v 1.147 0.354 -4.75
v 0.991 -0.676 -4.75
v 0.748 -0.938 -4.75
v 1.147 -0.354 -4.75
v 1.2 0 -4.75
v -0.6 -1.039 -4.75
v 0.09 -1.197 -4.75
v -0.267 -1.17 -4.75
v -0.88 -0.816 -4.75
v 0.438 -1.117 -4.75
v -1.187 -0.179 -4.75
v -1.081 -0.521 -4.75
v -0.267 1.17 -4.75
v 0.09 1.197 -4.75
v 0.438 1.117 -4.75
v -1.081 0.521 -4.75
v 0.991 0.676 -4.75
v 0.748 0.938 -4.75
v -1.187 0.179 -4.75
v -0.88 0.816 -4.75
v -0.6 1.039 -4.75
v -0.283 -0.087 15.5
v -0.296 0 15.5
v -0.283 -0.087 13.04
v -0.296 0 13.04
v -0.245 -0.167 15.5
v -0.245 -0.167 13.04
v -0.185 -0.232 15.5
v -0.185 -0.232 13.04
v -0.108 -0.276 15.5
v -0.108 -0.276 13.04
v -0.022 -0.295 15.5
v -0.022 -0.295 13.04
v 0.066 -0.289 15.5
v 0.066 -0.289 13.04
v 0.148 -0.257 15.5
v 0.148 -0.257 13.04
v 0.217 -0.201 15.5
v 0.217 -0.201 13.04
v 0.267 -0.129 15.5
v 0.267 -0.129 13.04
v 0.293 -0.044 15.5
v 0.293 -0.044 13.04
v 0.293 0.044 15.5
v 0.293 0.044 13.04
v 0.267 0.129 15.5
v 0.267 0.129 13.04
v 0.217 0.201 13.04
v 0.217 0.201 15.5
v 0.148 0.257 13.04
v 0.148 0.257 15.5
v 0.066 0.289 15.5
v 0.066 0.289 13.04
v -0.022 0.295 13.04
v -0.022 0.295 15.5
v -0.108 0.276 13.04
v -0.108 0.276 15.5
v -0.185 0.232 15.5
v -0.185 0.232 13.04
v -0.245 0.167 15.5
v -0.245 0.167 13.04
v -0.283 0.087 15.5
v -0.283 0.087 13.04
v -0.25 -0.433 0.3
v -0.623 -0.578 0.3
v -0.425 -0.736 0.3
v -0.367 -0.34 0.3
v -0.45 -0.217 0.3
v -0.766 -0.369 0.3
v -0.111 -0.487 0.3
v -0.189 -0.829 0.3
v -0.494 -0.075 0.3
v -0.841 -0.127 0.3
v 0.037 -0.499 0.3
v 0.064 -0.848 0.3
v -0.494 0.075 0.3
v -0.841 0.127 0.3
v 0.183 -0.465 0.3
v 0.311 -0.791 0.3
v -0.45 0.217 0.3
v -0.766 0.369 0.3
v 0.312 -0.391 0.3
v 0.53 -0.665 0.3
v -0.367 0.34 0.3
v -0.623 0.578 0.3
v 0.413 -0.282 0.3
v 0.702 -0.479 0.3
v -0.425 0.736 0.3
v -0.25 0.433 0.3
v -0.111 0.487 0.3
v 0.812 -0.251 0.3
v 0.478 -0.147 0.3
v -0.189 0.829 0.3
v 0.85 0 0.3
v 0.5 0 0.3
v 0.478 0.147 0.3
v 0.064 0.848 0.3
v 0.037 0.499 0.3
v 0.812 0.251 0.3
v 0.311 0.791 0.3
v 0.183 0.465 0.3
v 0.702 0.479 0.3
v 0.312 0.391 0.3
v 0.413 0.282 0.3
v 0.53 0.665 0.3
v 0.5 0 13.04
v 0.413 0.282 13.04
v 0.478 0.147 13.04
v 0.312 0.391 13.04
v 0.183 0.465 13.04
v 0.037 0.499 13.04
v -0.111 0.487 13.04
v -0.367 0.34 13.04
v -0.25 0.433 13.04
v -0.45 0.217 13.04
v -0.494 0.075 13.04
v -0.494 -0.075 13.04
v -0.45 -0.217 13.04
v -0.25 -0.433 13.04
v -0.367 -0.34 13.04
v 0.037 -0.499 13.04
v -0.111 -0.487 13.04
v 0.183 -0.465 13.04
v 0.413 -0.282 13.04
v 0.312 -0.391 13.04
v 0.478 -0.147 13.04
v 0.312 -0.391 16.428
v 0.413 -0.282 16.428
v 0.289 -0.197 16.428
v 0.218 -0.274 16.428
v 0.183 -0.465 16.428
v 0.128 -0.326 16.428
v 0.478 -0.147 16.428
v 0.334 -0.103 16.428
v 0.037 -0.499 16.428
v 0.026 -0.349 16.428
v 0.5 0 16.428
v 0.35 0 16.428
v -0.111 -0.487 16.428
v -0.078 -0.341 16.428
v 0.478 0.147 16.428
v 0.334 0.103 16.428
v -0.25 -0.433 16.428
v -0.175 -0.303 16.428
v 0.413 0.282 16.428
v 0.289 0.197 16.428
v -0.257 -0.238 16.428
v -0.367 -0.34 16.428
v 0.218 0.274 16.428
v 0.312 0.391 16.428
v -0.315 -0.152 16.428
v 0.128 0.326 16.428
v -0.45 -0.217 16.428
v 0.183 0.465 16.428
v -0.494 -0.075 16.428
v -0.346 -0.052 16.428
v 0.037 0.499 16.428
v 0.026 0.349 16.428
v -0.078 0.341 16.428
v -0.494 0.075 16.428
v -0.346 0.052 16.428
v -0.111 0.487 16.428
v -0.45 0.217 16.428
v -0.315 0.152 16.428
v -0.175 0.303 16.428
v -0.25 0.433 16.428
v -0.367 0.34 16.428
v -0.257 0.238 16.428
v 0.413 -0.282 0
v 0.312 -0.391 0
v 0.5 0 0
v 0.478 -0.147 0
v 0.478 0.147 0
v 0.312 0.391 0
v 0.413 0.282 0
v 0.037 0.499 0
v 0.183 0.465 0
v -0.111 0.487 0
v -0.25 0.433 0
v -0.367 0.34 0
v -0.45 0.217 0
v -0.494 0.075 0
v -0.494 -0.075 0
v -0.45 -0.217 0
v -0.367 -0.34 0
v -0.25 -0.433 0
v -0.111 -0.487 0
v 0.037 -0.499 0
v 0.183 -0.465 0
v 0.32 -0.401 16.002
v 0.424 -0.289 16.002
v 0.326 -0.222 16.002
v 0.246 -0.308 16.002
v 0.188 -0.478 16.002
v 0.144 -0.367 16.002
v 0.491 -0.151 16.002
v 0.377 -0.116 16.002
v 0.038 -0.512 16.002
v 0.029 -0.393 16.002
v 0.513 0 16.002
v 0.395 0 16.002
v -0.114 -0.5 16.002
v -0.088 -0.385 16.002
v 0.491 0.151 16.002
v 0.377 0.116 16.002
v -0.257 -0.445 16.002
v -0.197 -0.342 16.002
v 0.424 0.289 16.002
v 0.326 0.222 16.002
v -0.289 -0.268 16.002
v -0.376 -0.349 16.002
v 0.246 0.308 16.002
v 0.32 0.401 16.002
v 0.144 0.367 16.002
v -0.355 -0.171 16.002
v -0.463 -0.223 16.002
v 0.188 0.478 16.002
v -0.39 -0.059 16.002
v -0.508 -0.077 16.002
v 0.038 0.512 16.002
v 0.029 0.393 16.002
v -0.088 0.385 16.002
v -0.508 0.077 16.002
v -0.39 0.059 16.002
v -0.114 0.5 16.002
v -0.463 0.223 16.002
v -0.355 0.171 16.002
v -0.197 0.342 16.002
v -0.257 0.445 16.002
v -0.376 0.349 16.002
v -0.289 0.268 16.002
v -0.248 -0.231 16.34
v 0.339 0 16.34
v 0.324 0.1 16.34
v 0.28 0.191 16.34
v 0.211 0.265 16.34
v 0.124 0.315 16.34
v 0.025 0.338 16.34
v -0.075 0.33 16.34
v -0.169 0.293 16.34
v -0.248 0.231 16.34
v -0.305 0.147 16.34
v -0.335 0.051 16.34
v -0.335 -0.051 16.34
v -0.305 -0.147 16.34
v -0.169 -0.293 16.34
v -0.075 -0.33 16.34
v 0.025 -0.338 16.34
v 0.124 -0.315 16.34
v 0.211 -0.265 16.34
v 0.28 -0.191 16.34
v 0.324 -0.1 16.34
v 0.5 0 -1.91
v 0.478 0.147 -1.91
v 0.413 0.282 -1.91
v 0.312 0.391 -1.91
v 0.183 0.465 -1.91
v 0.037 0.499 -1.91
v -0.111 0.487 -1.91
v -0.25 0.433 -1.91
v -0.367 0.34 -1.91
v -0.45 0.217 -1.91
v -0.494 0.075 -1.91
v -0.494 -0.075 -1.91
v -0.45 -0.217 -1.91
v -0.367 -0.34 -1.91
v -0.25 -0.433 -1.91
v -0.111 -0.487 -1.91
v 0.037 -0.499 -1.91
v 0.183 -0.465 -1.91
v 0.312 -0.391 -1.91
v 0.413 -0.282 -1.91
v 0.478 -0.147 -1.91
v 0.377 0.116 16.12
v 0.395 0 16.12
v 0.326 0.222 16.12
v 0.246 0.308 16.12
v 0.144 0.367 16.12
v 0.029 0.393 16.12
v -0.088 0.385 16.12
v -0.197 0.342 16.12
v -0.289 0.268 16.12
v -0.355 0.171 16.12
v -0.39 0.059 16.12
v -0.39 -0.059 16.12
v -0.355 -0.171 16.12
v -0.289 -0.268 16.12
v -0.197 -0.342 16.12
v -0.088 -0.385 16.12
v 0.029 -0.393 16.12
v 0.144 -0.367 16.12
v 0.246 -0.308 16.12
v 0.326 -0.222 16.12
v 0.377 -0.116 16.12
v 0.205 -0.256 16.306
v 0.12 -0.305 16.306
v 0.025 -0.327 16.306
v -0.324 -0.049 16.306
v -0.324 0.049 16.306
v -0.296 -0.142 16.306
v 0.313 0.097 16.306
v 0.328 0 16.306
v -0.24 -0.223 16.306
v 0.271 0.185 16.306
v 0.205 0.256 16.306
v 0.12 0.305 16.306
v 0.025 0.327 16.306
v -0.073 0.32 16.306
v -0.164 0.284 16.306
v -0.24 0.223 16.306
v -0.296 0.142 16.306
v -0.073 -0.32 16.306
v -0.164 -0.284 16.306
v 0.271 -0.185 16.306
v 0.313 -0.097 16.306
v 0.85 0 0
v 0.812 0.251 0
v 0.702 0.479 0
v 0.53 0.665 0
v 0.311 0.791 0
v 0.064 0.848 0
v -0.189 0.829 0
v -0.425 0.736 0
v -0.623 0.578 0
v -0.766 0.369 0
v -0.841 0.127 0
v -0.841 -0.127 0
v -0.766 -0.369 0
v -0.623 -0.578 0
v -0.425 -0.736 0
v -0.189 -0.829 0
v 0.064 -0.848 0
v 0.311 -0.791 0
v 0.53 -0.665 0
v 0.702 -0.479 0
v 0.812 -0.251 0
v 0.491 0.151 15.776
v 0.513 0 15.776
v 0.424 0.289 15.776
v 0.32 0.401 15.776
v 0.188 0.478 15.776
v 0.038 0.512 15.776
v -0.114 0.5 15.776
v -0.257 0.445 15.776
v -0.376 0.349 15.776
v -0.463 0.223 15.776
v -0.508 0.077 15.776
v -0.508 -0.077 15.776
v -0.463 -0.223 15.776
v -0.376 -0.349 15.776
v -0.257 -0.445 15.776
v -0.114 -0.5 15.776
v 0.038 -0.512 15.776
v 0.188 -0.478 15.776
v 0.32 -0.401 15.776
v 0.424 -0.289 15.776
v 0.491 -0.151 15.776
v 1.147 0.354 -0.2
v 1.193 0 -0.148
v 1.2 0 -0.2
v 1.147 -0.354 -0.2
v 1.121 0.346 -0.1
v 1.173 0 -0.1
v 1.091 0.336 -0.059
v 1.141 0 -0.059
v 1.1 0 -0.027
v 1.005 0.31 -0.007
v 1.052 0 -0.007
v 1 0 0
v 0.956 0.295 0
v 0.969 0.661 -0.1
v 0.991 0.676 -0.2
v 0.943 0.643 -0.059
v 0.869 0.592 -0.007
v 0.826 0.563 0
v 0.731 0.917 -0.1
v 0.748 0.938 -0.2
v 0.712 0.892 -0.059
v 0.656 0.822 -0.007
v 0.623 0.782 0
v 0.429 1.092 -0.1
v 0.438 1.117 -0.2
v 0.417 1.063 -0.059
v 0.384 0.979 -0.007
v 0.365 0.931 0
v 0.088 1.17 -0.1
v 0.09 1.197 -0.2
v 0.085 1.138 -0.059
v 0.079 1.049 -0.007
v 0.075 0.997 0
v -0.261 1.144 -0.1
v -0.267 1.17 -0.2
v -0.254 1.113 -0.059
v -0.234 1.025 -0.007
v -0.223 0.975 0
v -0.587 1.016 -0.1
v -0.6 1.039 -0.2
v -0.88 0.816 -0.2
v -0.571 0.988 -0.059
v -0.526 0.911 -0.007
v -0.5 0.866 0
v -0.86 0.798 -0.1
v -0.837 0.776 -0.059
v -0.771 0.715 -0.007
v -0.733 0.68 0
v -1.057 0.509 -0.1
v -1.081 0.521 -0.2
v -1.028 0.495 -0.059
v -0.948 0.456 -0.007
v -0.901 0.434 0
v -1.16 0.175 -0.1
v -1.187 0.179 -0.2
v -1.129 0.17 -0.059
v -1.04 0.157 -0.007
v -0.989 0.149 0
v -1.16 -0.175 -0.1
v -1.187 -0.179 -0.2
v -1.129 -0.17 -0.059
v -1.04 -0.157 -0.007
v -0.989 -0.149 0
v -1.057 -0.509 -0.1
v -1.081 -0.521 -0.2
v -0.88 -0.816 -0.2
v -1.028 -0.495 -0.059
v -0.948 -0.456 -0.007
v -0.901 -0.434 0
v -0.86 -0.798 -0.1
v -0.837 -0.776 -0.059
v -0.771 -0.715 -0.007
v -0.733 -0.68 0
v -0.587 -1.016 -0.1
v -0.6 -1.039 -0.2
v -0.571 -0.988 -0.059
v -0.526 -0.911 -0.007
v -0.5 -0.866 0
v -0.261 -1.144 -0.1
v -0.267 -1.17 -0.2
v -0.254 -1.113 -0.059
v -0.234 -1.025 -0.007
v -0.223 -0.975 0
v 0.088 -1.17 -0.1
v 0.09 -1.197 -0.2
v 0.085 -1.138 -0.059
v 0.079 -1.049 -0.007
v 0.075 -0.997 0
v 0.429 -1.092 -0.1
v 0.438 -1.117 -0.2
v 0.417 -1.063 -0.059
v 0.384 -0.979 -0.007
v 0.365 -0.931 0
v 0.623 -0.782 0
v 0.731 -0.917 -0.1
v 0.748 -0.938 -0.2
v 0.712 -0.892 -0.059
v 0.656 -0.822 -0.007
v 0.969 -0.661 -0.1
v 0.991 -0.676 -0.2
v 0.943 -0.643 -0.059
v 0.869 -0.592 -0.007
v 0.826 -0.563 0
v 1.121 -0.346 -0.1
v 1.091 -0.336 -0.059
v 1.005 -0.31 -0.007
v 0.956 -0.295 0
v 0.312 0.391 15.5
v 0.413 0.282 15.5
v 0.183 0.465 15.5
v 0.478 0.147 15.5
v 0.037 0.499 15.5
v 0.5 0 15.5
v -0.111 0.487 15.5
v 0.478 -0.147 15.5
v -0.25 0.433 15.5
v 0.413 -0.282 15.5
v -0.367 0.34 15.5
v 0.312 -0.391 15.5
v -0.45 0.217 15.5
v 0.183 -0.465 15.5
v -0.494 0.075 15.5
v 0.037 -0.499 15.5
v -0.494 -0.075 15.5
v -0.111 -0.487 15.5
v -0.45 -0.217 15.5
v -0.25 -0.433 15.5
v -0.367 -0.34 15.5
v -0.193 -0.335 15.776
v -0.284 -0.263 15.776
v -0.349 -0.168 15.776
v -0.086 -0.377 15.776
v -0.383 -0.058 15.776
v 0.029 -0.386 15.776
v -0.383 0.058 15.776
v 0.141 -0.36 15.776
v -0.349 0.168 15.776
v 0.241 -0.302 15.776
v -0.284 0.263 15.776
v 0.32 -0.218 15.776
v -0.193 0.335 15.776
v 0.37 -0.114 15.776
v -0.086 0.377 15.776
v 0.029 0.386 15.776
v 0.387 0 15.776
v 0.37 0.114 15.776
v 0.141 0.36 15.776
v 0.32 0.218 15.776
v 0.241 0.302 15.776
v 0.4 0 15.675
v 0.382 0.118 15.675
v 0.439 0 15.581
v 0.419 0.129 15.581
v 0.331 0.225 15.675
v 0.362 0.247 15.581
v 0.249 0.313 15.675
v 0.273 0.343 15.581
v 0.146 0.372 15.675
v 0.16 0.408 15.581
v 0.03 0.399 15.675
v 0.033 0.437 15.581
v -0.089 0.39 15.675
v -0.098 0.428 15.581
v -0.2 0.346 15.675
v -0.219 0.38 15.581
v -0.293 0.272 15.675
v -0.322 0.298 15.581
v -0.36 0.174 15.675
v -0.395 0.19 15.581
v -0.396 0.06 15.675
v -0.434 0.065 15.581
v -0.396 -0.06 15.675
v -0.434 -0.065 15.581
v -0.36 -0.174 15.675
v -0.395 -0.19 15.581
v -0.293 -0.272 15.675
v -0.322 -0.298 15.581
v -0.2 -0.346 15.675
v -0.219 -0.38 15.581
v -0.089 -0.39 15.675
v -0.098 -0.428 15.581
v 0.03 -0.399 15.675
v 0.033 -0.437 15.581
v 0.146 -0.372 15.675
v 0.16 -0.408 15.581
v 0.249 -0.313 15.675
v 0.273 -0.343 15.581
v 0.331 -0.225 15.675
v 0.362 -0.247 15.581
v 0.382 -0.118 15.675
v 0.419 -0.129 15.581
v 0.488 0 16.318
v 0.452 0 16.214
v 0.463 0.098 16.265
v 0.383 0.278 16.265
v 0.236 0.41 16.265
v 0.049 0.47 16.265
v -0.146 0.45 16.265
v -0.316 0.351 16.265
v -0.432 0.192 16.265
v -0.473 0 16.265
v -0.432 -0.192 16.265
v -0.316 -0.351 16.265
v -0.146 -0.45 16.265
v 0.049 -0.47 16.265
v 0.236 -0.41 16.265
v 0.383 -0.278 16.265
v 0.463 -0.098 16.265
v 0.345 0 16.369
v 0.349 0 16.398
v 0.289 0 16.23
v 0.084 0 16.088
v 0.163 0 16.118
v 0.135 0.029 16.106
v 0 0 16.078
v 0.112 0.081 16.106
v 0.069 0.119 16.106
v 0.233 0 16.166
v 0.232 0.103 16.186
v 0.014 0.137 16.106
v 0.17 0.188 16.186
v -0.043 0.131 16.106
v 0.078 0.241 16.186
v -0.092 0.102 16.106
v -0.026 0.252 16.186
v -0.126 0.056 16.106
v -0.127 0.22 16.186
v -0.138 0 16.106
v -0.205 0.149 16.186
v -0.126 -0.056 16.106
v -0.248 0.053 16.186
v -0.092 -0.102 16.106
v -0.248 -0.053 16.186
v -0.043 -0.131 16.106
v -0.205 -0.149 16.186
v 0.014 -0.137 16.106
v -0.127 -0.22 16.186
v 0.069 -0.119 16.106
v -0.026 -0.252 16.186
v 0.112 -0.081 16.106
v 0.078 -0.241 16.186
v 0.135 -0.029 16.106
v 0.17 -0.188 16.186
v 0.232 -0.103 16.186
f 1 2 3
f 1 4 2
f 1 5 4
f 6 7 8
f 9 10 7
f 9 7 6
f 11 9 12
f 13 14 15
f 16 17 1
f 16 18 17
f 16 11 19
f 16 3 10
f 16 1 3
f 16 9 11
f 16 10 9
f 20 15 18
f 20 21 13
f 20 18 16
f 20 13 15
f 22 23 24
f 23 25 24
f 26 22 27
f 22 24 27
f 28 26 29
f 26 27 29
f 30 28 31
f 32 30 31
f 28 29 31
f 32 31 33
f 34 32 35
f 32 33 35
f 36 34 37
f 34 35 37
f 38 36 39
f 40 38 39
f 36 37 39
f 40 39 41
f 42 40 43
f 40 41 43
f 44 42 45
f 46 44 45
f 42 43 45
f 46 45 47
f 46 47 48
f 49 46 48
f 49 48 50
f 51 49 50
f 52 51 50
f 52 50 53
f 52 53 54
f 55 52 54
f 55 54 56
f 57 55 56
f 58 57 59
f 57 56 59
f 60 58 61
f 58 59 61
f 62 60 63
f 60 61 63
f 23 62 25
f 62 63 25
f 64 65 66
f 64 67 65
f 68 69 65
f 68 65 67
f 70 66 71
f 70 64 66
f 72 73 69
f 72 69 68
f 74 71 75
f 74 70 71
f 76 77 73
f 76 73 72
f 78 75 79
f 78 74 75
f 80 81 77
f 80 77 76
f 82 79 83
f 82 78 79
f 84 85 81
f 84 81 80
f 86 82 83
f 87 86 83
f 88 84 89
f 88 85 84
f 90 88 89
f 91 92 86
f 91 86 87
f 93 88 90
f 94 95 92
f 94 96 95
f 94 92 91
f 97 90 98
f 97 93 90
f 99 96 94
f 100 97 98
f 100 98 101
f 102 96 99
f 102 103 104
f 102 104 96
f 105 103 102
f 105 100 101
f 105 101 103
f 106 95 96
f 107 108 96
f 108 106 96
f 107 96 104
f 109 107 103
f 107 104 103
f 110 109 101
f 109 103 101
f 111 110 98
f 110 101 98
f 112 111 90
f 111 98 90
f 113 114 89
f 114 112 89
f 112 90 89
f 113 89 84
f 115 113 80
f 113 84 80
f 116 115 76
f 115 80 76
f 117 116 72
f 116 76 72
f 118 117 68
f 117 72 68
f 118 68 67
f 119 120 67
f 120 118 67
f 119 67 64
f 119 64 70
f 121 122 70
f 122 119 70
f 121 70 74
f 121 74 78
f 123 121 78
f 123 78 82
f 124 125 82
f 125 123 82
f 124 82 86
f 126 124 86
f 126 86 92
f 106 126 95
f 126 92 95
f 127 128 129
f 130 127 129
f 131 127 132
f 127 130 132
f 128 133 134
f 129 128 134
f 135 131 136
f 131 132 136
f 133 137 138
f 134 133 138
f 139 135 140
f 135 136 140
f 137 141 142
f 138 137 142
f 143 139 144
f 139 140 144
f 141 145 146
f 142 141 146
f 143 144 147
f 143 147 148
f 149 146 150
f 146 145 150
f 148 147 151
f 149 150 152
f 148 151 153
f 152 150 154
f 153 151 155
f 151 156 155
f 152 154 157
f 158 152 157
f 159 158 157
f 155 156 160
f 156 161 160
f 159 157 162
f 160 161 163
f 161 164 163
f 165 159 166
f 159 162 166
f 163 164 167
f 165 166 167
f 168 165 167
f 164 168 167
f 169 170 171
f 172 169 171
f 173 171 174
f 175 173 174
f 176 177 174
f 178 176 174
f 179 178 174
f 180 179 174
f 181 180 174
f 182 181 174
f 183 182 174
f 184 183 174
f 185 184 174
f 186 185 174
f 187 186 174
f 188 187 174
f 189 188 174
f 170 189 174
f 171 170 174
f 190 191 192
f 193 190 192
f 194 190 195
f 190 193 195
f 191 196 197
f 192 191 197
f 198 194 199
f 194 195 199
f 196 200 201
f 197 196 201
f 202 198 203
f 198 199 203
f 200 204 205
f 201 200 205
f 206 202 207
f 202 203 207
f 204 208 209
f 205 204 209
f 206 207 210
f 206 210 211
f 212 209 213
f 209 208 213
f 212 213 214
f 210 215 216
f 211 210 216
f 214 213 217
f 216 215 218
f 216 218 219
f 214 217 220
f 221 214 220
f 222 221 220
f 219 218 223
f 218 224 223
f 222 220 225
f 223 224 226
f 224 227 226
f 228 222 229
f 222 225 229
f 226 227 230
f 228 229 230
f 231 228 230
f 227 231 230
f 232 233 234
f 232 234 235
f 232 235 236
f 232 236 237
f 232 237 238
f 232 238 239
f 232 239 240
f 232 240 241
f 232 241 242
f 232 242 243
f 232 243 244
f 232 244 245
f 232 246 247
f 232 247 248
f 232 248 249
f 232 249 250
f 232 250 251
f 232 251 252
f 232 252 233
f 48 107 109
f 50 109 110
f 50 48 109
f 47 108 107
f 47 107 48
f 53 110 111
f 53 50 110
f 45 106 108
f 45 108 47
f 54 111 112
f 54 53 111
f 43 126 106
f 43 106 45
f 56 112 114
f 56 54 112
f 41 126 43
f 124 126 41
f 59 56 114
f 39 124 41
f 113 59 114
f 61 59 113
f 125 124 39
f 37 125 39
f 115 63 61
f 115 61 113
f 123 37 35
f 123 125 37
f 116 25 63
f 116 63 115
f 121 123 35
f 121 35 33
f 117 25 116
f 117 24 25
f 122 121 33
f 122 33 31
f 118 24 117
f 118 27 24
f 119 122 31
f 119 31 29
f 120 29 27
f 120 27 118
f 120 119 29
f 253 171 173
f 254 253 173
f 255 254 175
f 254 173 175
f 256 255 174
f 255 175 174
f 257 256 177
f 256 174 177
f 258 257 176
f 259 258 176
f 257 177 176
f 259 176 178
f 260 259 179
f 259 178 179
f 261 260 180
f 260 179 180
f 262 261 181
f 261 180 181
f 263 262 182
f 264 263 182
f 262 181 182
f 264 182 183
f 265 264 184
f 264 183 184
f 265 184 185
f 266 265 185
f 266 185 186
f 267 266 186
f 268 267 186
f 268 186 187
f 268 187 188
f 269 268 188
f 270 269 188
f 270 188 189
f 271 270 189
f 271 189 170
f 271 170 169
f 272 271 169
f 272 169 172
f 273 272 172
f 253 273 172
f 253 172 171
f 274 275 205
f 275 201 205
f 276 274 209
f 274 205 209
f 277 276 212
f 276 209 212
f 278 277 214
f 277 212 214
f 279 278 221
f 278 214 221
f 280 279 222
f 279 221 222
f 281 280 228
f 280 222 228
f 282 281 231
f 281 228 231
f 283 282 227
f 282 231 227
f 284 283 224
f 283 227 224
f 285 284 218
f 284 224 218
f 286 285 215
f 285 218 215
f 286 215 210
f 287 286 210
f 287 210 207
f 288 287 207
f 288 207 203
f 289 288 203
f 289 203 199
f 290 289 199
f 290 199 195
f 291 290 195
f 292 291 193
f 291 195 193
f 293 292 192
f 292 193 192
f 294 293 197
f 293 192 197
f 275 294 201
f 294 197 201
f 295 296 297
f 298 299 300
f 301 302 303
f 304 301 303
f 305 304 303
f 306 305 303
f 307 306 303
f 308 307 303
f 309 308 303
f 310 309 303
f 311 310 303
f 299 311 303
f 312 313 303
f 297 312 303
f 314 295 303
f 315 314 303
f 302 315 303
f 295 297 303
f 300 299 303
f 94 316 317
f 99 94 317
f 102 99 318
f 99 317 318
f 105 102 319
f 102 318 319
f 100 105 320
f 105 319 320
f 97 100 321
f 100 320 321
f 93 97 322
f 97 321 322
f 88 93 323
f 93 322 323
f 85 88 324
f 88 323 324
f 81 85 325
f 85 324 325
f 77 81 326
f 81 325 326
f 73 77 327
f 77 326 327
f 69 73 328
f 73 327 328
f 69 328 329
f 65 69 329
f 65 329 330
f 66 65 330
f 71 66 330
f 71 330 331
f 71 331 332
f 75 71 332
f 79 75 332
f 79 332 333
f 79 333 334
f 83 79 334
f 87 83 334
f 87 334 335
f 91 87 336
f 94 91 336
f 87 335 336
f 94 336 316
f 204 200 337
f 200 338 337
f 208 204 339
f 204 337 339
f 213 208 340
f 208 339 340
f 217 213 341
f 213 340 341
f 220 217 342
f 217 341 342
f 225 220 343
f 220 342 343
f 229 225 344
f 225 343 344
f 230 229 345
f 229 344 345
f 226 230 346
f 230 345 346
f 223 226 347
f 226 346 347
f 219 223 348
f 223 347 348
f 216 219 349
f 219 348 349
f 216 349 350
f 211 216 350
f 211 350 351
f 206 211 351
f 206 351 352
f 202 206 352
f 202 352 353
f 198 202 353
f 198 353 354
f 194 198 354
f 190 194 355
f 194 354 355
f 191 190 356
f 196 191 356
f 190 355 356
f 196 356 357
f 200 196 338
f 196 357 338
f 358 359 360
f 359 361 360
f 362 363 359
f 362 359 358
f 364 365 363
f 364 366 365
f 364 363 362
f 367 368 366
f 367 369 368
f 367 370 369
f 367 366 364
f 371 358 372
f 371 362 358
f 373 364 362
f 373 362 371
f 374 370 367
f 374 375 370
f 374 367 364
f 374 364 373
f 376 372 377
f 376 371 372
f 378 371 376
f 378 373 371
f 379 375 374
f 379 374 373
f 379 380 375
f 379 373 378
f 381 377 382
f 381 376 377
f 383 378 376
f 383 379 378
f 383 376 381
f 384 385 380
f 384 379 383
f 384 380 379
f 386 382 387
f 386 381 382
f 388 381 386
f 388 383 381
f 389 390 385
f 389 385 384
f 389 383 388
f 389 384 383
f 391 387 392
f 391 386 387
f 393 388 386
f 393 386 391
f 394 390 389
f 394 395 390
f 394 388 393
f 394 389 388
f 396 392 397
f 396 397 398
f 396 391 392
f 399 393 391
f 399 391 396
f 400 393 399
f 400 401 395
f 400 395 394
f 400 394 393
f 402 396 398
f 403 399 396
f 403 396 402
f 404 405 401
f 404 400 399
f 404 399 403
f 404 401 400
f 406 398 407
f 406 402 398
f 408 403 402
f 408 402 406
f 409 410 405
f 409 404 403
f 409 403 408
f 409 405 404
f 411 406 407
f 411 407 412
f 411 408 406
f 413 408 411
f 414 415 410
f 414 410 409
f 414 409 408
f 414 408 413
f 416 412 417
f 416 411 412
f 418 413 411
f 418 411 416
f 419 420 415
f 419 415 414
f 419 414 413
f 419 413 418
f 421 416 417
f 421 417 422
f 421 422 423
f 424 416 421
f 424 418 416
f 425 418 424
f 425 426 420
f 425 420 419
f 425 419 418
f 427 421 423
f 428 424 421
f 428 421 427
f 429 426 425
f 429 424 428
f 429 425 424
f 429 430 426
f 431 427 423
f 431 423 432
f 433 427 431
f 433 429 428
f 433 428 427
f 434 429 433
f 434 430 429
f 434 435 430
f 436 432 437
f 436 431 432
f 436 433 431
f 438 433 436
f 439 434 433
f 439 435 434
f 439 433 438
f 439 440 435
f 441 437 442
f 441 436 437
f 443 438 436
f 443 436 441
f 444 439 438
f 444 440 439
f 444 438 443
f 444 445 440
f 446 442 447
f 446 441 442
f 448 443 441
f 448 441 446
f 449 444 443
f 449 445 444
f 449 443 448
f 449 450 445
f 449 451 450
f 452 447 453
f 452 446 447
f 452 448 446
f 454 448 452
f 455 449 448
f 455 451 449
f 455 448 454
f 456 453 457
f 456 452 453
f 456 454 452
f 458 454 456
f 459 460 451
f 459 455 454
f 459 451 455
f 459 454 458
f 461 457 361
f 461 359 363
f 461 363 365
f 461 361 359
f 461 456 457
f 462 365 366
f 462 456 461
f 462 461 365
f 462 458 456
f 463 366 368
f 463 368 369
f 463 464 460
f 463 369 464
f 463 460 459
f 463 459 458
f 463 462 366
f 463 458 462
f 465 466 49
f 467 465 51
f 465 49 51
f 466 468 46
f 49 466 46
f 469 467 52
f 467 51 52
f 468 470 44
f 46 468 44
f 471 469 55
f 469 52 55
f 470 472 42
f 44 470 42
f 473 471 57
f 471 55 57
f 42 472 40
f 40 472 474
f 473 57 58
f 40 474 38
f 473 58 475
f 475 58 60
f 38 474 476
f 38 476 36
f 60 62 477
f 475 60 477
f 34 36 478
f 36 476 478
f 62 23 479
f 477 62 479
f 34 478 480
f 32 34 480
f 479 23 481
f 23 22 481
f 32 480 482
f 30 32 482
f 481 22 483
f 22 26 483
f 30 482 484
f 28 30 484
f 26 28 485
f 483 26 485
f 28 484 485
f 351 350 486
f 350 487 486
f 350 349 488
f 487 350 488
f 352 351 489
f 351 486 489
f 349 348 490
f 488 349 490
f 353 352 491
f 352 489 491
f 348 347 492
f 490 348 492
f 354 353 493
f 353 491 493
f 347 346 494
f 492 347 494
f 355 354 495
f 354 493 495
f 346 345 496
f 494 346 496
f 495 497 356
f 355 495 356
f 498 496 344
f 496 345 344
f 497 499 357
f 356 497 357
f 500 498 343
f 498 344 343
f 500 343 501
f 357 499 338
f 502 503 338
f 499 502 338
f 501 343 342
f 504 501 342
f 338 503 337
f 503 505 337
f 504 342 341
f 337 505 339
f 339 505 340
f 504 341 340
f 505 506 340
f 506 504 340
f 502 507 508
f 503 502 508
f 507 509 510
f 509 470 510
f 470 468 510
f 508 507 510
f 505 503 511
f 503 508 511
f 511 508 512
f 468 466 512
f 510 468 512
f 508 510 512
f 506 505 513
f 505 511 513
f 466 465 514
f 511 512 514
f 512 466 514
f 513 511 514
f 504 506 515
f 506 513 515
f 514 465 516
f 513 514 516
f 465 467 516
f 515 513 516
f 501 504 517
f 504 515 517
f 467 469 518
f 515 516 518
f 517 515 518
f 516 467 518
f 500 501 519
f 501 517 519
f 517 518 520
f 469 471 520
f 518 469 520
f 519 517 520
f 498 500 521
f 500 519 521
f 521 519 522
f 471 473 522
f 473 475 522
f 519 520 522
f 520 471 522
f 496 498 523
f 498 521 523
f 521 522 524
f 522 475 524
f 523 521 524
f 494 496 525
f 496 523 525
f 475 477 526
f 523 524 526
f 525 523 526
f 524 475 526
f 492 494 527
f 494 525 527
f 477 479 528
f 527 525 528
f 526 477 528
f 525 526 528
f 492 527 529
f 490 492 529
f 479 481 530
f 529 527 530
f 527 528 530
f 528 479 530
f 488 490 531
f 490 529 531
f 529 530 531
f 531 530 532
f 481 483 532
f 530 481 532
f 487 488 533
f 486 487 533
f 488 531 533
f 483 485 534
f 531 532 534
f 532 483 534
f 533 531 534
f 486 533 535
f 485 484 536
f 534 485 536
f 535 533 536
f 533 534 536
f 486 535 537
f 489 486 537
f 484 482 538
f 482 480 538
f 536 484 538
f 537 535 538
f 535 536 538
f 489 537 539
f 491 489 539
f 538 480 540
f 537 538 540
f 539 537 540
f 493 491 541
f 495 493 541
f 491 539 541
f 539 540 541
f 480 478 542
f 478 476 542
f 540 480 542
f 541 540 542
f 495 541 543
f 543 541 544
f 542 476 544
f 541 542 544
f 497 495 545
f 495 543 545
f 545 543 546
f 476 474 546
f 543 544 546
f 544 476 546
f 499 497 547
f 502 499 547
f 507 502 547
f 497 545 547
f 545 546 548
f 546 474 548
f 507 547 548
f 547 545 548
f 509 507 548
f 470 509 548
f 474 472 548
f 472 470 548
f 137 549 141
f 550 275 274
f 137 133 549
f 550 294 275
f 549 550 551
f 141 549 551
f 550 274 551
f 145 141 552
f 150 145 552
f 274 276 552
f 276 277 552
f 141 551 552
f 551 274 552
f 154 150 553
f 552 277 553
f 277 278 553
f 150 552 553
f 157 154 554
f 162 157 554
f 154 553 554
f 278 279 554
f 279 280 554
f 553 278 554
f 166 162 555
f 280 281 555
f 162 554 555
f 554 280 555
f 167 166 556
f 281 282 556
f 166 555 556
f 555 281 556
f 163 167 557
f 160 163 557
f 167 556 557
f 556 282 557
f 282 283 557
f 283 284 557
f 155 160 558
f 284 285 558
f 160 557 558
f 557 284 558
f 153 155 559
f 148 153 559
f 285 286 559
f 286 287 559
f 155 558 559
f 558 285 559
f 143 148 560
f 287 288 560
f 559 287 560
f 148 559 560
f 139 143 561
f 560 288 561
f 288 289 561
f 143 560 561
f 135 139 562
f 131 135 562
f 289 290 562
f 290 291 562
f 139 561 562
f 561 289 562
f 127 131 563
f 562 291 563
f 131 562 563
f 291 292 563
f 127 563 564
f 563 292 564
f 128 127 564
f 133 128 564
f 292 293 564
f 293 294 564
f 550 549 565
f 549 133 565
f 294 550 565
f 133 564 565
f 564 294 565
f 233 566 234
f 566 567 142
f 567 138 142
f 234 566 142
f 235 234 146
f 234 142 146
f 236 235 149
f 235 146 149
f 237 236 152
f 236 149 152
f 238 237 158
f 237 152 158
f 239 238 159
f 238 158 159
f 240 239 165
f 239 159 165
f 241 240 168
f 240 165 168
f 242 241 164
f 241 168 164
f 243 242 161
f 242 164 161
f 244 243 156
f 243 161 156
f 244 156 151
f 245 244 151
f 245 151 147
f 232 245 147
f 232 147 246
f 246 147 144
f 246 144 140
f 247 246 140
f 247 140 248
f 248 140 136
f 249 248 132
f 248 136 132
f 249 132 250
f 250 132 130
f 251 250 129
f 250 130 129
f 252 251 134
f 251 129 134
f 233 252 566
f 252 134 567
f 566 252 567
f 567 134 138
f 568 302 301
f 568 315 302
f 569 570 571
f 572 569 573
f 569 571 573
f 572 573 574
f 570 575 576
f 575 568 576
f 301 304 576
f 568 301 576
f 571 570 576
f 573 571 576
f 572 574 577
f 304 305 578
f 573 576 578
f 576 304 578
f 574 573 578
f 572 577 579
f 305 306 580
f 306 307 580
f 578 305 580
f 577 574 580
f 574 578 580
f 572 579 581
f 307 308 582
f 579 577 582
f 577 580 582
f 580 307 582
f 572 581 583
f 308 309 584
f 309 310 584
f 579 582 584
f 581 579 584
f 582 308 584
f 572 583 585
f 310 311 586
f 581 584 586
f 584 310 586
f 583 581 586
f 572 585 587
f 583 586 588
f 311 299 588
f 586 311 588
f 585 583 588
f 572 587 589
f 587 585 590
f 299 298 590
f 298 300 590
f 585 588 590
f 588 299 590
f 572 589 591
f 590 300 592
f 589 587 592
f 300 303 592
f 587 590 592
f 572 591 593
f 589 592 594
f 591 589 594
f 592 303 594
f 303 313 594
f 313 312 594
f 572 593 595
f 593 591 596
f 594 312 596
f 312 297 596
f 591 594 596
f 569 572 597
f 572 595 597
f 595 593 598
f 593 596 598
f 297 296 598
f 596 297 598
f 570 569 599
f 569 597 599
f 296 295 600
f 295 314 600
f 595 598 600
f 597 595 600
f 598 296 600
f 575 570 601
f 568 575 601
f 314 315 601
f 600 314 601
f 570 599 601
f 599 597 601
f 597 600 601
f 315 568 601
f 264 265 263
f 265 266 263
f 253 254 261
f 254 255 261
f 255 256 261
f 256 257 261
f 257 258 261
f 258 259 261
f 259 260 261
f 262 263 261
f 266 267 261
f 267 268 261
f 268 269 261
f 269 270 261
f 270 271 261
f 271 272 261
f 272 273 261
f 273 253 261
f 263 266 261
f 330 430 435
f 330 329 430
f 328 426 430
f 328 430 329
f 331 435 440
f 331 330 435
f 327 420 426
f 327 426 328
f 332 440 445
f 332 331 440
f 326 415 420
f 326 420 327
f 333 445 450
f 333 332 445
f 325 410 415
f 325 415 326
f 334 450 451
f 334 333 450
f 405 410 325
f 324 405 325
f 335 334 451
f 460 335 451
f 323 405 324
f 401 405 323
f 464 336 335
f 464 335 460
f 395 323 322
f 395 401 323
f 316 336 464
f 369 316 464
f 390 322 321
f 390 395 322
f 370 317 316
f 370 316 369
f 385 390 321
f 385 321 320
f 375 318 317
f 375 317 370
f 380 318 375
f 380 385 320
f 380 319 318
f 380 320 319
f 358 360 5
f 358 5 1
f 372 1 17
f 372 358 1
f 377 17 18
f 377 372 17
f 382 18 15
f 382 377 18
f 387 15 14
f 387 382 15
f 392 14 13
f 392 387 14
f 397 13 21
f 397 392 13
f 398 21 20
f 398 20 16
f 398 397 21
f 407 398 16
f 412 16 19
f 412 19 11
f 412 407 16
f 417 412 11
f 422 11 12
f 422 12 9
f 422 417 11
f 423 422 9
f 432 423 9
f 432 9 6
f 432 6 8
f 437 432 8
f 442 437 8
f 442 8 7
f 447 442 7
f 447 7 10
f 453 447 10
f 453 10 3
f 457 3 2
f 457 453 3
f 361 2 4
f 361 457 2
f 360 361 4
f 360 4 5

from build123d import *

# Parameters (mm, degrees)
SKETCH1_R           = 0.5
BOSS_EXTRUDE1_DEPTH = 15.5
SKETCH1_3_R         = 1.2
SKETCH1_3_R_2       = 0.5
BOSS_EXTRUDE2_DEPTH = 4.75
FILLET1_R           = 0.2
SKETCH2_R           = 0.85
BOSS_EXTRUDE3_DEPTH = 0.3
SKETCH4_W           = 0.465575533
SKETCH4_H           = 0.034477487
SKETCH5_W           = 1.257485092
SKETCH5_H           = 2.46
SKETCH6_R           = 0.5
BOSS_EXTRUDE4_DEPTH = 2.84


with BuildPart() as part:
    # Sketch1 → Boss-Extrude1 (new body)
    with BuildSketch(Plane.XY):
        Circle(SKETCH1_R)
    extrude(amount=BOSS_EXTRUDE1_DEPTH)



with BuildPart() as body_2:
    # Sketch1<3> → Boss-Extrude2 (new body)
    with BuildSketch(Plane.XY):
        Circle(SKETCH1_3_R)
        Circle(SKETCH1_3_R_2, mode=Mode.SUBTRACT)
    extrude(amount=-BOSS_EXTRUDE2_DEPTH)

    # Fillet1
    fillet1_edges = [body_2.edges().sort_by_distance(p)[0] for p in [
        (-1.2, 0, 0),
    ]]
    fillet(fillet1_edges, radius=FILLET1_R)


with BuildPart() as part_1:
    add(part.part)

    add(body_2.part)  # Boss-Extrude3 merges body 2
    # Sketch2 → Boss-Extrude3 (add)
    with BuildSketch(Plane.XY):
        Circle(SKETCH2_R)
    extrude(amount=BOSS_EXTRUDE3_DEPTH)

    # Sketch3 → Revolve1 (revolve)
    with BuildSketch(Plane(origin=(0, 0, 0), x_dir=(1, 0, 0), z_dir=(0, 1, 0))):
        with BuildLine():
            Line((0.5, -15.5), (0, -15.5))
            Line((0, -15.5), (0, -16.0775))
            ThreePointArc((0, -16.0775), (0.247487373, -16.180012627), (0.35, -16.4275))
            Line((0.35, -16.4275), (0.5, -16.4275))
            ThreePointArc((0.5, -16.4275), (0.472905202, -16.265140307), (0.39455732, -16.120377026))
            Line((0.39455732, -16.120377026), (0.39455732, -16.001977042))
            Line((0.39455732, -16.001977042), (0.513344718, -16.001977042))
            Line((0.513344718, -16.001977042), (0.513344718, -15.7758978))
            Line((0.513344718, -15.7758978), (0.386893617, -15.7758978))
            ThreePointArc((0.386893617, -15.7758978), (0.416267844, -15.626806679), (0.5, -15.5))
        make_face()
    revolve(axis=Axis((0, 0, 15.5), (0, 0, 1)))

    # Sketch4 → Revolve2 (revolve)
    with BuildSketch(Plane(origin=(0, 0, 0), x_dir=(1, 0, 0), z_dir=(0, 1, 0))):
        with Locations((-0.232787767, -16.322761257)):
            Rectangle(SKETCH4_W, SKETCH4_H)
    revolve(axis=Axis((0, 0, 16.305522513), (0, 0, 1)))

    # Sketch5 → Cut-Revolve1 (revolve, cut)
    with BuildSketch(Plane(origin=(0, 0, 0), x_dir=(1, 0, 0), z_dir=(0, 1, 0))):
        with Locations((-0.924942546, -14.27)):
            Rectangle(SKETCH5_W, SKETCH5_H)
    revolve(axis=Axis((0, 0, 15.5), (0, 0, 1)), mode=Mode.SUBTRACT)

    # Sketch6 → Boss-Extrude4 (add)
    with BuildSketch(Plane(origin=(0, 0, -4.75), x_dir=(-1, 0, 0), z_dir=(0, 0, -1))):
        Circle(SKETCH6_R)
    extrude(amount=-BOSS_EXTRUDE4_DEPTH)


solid = part_1.part
